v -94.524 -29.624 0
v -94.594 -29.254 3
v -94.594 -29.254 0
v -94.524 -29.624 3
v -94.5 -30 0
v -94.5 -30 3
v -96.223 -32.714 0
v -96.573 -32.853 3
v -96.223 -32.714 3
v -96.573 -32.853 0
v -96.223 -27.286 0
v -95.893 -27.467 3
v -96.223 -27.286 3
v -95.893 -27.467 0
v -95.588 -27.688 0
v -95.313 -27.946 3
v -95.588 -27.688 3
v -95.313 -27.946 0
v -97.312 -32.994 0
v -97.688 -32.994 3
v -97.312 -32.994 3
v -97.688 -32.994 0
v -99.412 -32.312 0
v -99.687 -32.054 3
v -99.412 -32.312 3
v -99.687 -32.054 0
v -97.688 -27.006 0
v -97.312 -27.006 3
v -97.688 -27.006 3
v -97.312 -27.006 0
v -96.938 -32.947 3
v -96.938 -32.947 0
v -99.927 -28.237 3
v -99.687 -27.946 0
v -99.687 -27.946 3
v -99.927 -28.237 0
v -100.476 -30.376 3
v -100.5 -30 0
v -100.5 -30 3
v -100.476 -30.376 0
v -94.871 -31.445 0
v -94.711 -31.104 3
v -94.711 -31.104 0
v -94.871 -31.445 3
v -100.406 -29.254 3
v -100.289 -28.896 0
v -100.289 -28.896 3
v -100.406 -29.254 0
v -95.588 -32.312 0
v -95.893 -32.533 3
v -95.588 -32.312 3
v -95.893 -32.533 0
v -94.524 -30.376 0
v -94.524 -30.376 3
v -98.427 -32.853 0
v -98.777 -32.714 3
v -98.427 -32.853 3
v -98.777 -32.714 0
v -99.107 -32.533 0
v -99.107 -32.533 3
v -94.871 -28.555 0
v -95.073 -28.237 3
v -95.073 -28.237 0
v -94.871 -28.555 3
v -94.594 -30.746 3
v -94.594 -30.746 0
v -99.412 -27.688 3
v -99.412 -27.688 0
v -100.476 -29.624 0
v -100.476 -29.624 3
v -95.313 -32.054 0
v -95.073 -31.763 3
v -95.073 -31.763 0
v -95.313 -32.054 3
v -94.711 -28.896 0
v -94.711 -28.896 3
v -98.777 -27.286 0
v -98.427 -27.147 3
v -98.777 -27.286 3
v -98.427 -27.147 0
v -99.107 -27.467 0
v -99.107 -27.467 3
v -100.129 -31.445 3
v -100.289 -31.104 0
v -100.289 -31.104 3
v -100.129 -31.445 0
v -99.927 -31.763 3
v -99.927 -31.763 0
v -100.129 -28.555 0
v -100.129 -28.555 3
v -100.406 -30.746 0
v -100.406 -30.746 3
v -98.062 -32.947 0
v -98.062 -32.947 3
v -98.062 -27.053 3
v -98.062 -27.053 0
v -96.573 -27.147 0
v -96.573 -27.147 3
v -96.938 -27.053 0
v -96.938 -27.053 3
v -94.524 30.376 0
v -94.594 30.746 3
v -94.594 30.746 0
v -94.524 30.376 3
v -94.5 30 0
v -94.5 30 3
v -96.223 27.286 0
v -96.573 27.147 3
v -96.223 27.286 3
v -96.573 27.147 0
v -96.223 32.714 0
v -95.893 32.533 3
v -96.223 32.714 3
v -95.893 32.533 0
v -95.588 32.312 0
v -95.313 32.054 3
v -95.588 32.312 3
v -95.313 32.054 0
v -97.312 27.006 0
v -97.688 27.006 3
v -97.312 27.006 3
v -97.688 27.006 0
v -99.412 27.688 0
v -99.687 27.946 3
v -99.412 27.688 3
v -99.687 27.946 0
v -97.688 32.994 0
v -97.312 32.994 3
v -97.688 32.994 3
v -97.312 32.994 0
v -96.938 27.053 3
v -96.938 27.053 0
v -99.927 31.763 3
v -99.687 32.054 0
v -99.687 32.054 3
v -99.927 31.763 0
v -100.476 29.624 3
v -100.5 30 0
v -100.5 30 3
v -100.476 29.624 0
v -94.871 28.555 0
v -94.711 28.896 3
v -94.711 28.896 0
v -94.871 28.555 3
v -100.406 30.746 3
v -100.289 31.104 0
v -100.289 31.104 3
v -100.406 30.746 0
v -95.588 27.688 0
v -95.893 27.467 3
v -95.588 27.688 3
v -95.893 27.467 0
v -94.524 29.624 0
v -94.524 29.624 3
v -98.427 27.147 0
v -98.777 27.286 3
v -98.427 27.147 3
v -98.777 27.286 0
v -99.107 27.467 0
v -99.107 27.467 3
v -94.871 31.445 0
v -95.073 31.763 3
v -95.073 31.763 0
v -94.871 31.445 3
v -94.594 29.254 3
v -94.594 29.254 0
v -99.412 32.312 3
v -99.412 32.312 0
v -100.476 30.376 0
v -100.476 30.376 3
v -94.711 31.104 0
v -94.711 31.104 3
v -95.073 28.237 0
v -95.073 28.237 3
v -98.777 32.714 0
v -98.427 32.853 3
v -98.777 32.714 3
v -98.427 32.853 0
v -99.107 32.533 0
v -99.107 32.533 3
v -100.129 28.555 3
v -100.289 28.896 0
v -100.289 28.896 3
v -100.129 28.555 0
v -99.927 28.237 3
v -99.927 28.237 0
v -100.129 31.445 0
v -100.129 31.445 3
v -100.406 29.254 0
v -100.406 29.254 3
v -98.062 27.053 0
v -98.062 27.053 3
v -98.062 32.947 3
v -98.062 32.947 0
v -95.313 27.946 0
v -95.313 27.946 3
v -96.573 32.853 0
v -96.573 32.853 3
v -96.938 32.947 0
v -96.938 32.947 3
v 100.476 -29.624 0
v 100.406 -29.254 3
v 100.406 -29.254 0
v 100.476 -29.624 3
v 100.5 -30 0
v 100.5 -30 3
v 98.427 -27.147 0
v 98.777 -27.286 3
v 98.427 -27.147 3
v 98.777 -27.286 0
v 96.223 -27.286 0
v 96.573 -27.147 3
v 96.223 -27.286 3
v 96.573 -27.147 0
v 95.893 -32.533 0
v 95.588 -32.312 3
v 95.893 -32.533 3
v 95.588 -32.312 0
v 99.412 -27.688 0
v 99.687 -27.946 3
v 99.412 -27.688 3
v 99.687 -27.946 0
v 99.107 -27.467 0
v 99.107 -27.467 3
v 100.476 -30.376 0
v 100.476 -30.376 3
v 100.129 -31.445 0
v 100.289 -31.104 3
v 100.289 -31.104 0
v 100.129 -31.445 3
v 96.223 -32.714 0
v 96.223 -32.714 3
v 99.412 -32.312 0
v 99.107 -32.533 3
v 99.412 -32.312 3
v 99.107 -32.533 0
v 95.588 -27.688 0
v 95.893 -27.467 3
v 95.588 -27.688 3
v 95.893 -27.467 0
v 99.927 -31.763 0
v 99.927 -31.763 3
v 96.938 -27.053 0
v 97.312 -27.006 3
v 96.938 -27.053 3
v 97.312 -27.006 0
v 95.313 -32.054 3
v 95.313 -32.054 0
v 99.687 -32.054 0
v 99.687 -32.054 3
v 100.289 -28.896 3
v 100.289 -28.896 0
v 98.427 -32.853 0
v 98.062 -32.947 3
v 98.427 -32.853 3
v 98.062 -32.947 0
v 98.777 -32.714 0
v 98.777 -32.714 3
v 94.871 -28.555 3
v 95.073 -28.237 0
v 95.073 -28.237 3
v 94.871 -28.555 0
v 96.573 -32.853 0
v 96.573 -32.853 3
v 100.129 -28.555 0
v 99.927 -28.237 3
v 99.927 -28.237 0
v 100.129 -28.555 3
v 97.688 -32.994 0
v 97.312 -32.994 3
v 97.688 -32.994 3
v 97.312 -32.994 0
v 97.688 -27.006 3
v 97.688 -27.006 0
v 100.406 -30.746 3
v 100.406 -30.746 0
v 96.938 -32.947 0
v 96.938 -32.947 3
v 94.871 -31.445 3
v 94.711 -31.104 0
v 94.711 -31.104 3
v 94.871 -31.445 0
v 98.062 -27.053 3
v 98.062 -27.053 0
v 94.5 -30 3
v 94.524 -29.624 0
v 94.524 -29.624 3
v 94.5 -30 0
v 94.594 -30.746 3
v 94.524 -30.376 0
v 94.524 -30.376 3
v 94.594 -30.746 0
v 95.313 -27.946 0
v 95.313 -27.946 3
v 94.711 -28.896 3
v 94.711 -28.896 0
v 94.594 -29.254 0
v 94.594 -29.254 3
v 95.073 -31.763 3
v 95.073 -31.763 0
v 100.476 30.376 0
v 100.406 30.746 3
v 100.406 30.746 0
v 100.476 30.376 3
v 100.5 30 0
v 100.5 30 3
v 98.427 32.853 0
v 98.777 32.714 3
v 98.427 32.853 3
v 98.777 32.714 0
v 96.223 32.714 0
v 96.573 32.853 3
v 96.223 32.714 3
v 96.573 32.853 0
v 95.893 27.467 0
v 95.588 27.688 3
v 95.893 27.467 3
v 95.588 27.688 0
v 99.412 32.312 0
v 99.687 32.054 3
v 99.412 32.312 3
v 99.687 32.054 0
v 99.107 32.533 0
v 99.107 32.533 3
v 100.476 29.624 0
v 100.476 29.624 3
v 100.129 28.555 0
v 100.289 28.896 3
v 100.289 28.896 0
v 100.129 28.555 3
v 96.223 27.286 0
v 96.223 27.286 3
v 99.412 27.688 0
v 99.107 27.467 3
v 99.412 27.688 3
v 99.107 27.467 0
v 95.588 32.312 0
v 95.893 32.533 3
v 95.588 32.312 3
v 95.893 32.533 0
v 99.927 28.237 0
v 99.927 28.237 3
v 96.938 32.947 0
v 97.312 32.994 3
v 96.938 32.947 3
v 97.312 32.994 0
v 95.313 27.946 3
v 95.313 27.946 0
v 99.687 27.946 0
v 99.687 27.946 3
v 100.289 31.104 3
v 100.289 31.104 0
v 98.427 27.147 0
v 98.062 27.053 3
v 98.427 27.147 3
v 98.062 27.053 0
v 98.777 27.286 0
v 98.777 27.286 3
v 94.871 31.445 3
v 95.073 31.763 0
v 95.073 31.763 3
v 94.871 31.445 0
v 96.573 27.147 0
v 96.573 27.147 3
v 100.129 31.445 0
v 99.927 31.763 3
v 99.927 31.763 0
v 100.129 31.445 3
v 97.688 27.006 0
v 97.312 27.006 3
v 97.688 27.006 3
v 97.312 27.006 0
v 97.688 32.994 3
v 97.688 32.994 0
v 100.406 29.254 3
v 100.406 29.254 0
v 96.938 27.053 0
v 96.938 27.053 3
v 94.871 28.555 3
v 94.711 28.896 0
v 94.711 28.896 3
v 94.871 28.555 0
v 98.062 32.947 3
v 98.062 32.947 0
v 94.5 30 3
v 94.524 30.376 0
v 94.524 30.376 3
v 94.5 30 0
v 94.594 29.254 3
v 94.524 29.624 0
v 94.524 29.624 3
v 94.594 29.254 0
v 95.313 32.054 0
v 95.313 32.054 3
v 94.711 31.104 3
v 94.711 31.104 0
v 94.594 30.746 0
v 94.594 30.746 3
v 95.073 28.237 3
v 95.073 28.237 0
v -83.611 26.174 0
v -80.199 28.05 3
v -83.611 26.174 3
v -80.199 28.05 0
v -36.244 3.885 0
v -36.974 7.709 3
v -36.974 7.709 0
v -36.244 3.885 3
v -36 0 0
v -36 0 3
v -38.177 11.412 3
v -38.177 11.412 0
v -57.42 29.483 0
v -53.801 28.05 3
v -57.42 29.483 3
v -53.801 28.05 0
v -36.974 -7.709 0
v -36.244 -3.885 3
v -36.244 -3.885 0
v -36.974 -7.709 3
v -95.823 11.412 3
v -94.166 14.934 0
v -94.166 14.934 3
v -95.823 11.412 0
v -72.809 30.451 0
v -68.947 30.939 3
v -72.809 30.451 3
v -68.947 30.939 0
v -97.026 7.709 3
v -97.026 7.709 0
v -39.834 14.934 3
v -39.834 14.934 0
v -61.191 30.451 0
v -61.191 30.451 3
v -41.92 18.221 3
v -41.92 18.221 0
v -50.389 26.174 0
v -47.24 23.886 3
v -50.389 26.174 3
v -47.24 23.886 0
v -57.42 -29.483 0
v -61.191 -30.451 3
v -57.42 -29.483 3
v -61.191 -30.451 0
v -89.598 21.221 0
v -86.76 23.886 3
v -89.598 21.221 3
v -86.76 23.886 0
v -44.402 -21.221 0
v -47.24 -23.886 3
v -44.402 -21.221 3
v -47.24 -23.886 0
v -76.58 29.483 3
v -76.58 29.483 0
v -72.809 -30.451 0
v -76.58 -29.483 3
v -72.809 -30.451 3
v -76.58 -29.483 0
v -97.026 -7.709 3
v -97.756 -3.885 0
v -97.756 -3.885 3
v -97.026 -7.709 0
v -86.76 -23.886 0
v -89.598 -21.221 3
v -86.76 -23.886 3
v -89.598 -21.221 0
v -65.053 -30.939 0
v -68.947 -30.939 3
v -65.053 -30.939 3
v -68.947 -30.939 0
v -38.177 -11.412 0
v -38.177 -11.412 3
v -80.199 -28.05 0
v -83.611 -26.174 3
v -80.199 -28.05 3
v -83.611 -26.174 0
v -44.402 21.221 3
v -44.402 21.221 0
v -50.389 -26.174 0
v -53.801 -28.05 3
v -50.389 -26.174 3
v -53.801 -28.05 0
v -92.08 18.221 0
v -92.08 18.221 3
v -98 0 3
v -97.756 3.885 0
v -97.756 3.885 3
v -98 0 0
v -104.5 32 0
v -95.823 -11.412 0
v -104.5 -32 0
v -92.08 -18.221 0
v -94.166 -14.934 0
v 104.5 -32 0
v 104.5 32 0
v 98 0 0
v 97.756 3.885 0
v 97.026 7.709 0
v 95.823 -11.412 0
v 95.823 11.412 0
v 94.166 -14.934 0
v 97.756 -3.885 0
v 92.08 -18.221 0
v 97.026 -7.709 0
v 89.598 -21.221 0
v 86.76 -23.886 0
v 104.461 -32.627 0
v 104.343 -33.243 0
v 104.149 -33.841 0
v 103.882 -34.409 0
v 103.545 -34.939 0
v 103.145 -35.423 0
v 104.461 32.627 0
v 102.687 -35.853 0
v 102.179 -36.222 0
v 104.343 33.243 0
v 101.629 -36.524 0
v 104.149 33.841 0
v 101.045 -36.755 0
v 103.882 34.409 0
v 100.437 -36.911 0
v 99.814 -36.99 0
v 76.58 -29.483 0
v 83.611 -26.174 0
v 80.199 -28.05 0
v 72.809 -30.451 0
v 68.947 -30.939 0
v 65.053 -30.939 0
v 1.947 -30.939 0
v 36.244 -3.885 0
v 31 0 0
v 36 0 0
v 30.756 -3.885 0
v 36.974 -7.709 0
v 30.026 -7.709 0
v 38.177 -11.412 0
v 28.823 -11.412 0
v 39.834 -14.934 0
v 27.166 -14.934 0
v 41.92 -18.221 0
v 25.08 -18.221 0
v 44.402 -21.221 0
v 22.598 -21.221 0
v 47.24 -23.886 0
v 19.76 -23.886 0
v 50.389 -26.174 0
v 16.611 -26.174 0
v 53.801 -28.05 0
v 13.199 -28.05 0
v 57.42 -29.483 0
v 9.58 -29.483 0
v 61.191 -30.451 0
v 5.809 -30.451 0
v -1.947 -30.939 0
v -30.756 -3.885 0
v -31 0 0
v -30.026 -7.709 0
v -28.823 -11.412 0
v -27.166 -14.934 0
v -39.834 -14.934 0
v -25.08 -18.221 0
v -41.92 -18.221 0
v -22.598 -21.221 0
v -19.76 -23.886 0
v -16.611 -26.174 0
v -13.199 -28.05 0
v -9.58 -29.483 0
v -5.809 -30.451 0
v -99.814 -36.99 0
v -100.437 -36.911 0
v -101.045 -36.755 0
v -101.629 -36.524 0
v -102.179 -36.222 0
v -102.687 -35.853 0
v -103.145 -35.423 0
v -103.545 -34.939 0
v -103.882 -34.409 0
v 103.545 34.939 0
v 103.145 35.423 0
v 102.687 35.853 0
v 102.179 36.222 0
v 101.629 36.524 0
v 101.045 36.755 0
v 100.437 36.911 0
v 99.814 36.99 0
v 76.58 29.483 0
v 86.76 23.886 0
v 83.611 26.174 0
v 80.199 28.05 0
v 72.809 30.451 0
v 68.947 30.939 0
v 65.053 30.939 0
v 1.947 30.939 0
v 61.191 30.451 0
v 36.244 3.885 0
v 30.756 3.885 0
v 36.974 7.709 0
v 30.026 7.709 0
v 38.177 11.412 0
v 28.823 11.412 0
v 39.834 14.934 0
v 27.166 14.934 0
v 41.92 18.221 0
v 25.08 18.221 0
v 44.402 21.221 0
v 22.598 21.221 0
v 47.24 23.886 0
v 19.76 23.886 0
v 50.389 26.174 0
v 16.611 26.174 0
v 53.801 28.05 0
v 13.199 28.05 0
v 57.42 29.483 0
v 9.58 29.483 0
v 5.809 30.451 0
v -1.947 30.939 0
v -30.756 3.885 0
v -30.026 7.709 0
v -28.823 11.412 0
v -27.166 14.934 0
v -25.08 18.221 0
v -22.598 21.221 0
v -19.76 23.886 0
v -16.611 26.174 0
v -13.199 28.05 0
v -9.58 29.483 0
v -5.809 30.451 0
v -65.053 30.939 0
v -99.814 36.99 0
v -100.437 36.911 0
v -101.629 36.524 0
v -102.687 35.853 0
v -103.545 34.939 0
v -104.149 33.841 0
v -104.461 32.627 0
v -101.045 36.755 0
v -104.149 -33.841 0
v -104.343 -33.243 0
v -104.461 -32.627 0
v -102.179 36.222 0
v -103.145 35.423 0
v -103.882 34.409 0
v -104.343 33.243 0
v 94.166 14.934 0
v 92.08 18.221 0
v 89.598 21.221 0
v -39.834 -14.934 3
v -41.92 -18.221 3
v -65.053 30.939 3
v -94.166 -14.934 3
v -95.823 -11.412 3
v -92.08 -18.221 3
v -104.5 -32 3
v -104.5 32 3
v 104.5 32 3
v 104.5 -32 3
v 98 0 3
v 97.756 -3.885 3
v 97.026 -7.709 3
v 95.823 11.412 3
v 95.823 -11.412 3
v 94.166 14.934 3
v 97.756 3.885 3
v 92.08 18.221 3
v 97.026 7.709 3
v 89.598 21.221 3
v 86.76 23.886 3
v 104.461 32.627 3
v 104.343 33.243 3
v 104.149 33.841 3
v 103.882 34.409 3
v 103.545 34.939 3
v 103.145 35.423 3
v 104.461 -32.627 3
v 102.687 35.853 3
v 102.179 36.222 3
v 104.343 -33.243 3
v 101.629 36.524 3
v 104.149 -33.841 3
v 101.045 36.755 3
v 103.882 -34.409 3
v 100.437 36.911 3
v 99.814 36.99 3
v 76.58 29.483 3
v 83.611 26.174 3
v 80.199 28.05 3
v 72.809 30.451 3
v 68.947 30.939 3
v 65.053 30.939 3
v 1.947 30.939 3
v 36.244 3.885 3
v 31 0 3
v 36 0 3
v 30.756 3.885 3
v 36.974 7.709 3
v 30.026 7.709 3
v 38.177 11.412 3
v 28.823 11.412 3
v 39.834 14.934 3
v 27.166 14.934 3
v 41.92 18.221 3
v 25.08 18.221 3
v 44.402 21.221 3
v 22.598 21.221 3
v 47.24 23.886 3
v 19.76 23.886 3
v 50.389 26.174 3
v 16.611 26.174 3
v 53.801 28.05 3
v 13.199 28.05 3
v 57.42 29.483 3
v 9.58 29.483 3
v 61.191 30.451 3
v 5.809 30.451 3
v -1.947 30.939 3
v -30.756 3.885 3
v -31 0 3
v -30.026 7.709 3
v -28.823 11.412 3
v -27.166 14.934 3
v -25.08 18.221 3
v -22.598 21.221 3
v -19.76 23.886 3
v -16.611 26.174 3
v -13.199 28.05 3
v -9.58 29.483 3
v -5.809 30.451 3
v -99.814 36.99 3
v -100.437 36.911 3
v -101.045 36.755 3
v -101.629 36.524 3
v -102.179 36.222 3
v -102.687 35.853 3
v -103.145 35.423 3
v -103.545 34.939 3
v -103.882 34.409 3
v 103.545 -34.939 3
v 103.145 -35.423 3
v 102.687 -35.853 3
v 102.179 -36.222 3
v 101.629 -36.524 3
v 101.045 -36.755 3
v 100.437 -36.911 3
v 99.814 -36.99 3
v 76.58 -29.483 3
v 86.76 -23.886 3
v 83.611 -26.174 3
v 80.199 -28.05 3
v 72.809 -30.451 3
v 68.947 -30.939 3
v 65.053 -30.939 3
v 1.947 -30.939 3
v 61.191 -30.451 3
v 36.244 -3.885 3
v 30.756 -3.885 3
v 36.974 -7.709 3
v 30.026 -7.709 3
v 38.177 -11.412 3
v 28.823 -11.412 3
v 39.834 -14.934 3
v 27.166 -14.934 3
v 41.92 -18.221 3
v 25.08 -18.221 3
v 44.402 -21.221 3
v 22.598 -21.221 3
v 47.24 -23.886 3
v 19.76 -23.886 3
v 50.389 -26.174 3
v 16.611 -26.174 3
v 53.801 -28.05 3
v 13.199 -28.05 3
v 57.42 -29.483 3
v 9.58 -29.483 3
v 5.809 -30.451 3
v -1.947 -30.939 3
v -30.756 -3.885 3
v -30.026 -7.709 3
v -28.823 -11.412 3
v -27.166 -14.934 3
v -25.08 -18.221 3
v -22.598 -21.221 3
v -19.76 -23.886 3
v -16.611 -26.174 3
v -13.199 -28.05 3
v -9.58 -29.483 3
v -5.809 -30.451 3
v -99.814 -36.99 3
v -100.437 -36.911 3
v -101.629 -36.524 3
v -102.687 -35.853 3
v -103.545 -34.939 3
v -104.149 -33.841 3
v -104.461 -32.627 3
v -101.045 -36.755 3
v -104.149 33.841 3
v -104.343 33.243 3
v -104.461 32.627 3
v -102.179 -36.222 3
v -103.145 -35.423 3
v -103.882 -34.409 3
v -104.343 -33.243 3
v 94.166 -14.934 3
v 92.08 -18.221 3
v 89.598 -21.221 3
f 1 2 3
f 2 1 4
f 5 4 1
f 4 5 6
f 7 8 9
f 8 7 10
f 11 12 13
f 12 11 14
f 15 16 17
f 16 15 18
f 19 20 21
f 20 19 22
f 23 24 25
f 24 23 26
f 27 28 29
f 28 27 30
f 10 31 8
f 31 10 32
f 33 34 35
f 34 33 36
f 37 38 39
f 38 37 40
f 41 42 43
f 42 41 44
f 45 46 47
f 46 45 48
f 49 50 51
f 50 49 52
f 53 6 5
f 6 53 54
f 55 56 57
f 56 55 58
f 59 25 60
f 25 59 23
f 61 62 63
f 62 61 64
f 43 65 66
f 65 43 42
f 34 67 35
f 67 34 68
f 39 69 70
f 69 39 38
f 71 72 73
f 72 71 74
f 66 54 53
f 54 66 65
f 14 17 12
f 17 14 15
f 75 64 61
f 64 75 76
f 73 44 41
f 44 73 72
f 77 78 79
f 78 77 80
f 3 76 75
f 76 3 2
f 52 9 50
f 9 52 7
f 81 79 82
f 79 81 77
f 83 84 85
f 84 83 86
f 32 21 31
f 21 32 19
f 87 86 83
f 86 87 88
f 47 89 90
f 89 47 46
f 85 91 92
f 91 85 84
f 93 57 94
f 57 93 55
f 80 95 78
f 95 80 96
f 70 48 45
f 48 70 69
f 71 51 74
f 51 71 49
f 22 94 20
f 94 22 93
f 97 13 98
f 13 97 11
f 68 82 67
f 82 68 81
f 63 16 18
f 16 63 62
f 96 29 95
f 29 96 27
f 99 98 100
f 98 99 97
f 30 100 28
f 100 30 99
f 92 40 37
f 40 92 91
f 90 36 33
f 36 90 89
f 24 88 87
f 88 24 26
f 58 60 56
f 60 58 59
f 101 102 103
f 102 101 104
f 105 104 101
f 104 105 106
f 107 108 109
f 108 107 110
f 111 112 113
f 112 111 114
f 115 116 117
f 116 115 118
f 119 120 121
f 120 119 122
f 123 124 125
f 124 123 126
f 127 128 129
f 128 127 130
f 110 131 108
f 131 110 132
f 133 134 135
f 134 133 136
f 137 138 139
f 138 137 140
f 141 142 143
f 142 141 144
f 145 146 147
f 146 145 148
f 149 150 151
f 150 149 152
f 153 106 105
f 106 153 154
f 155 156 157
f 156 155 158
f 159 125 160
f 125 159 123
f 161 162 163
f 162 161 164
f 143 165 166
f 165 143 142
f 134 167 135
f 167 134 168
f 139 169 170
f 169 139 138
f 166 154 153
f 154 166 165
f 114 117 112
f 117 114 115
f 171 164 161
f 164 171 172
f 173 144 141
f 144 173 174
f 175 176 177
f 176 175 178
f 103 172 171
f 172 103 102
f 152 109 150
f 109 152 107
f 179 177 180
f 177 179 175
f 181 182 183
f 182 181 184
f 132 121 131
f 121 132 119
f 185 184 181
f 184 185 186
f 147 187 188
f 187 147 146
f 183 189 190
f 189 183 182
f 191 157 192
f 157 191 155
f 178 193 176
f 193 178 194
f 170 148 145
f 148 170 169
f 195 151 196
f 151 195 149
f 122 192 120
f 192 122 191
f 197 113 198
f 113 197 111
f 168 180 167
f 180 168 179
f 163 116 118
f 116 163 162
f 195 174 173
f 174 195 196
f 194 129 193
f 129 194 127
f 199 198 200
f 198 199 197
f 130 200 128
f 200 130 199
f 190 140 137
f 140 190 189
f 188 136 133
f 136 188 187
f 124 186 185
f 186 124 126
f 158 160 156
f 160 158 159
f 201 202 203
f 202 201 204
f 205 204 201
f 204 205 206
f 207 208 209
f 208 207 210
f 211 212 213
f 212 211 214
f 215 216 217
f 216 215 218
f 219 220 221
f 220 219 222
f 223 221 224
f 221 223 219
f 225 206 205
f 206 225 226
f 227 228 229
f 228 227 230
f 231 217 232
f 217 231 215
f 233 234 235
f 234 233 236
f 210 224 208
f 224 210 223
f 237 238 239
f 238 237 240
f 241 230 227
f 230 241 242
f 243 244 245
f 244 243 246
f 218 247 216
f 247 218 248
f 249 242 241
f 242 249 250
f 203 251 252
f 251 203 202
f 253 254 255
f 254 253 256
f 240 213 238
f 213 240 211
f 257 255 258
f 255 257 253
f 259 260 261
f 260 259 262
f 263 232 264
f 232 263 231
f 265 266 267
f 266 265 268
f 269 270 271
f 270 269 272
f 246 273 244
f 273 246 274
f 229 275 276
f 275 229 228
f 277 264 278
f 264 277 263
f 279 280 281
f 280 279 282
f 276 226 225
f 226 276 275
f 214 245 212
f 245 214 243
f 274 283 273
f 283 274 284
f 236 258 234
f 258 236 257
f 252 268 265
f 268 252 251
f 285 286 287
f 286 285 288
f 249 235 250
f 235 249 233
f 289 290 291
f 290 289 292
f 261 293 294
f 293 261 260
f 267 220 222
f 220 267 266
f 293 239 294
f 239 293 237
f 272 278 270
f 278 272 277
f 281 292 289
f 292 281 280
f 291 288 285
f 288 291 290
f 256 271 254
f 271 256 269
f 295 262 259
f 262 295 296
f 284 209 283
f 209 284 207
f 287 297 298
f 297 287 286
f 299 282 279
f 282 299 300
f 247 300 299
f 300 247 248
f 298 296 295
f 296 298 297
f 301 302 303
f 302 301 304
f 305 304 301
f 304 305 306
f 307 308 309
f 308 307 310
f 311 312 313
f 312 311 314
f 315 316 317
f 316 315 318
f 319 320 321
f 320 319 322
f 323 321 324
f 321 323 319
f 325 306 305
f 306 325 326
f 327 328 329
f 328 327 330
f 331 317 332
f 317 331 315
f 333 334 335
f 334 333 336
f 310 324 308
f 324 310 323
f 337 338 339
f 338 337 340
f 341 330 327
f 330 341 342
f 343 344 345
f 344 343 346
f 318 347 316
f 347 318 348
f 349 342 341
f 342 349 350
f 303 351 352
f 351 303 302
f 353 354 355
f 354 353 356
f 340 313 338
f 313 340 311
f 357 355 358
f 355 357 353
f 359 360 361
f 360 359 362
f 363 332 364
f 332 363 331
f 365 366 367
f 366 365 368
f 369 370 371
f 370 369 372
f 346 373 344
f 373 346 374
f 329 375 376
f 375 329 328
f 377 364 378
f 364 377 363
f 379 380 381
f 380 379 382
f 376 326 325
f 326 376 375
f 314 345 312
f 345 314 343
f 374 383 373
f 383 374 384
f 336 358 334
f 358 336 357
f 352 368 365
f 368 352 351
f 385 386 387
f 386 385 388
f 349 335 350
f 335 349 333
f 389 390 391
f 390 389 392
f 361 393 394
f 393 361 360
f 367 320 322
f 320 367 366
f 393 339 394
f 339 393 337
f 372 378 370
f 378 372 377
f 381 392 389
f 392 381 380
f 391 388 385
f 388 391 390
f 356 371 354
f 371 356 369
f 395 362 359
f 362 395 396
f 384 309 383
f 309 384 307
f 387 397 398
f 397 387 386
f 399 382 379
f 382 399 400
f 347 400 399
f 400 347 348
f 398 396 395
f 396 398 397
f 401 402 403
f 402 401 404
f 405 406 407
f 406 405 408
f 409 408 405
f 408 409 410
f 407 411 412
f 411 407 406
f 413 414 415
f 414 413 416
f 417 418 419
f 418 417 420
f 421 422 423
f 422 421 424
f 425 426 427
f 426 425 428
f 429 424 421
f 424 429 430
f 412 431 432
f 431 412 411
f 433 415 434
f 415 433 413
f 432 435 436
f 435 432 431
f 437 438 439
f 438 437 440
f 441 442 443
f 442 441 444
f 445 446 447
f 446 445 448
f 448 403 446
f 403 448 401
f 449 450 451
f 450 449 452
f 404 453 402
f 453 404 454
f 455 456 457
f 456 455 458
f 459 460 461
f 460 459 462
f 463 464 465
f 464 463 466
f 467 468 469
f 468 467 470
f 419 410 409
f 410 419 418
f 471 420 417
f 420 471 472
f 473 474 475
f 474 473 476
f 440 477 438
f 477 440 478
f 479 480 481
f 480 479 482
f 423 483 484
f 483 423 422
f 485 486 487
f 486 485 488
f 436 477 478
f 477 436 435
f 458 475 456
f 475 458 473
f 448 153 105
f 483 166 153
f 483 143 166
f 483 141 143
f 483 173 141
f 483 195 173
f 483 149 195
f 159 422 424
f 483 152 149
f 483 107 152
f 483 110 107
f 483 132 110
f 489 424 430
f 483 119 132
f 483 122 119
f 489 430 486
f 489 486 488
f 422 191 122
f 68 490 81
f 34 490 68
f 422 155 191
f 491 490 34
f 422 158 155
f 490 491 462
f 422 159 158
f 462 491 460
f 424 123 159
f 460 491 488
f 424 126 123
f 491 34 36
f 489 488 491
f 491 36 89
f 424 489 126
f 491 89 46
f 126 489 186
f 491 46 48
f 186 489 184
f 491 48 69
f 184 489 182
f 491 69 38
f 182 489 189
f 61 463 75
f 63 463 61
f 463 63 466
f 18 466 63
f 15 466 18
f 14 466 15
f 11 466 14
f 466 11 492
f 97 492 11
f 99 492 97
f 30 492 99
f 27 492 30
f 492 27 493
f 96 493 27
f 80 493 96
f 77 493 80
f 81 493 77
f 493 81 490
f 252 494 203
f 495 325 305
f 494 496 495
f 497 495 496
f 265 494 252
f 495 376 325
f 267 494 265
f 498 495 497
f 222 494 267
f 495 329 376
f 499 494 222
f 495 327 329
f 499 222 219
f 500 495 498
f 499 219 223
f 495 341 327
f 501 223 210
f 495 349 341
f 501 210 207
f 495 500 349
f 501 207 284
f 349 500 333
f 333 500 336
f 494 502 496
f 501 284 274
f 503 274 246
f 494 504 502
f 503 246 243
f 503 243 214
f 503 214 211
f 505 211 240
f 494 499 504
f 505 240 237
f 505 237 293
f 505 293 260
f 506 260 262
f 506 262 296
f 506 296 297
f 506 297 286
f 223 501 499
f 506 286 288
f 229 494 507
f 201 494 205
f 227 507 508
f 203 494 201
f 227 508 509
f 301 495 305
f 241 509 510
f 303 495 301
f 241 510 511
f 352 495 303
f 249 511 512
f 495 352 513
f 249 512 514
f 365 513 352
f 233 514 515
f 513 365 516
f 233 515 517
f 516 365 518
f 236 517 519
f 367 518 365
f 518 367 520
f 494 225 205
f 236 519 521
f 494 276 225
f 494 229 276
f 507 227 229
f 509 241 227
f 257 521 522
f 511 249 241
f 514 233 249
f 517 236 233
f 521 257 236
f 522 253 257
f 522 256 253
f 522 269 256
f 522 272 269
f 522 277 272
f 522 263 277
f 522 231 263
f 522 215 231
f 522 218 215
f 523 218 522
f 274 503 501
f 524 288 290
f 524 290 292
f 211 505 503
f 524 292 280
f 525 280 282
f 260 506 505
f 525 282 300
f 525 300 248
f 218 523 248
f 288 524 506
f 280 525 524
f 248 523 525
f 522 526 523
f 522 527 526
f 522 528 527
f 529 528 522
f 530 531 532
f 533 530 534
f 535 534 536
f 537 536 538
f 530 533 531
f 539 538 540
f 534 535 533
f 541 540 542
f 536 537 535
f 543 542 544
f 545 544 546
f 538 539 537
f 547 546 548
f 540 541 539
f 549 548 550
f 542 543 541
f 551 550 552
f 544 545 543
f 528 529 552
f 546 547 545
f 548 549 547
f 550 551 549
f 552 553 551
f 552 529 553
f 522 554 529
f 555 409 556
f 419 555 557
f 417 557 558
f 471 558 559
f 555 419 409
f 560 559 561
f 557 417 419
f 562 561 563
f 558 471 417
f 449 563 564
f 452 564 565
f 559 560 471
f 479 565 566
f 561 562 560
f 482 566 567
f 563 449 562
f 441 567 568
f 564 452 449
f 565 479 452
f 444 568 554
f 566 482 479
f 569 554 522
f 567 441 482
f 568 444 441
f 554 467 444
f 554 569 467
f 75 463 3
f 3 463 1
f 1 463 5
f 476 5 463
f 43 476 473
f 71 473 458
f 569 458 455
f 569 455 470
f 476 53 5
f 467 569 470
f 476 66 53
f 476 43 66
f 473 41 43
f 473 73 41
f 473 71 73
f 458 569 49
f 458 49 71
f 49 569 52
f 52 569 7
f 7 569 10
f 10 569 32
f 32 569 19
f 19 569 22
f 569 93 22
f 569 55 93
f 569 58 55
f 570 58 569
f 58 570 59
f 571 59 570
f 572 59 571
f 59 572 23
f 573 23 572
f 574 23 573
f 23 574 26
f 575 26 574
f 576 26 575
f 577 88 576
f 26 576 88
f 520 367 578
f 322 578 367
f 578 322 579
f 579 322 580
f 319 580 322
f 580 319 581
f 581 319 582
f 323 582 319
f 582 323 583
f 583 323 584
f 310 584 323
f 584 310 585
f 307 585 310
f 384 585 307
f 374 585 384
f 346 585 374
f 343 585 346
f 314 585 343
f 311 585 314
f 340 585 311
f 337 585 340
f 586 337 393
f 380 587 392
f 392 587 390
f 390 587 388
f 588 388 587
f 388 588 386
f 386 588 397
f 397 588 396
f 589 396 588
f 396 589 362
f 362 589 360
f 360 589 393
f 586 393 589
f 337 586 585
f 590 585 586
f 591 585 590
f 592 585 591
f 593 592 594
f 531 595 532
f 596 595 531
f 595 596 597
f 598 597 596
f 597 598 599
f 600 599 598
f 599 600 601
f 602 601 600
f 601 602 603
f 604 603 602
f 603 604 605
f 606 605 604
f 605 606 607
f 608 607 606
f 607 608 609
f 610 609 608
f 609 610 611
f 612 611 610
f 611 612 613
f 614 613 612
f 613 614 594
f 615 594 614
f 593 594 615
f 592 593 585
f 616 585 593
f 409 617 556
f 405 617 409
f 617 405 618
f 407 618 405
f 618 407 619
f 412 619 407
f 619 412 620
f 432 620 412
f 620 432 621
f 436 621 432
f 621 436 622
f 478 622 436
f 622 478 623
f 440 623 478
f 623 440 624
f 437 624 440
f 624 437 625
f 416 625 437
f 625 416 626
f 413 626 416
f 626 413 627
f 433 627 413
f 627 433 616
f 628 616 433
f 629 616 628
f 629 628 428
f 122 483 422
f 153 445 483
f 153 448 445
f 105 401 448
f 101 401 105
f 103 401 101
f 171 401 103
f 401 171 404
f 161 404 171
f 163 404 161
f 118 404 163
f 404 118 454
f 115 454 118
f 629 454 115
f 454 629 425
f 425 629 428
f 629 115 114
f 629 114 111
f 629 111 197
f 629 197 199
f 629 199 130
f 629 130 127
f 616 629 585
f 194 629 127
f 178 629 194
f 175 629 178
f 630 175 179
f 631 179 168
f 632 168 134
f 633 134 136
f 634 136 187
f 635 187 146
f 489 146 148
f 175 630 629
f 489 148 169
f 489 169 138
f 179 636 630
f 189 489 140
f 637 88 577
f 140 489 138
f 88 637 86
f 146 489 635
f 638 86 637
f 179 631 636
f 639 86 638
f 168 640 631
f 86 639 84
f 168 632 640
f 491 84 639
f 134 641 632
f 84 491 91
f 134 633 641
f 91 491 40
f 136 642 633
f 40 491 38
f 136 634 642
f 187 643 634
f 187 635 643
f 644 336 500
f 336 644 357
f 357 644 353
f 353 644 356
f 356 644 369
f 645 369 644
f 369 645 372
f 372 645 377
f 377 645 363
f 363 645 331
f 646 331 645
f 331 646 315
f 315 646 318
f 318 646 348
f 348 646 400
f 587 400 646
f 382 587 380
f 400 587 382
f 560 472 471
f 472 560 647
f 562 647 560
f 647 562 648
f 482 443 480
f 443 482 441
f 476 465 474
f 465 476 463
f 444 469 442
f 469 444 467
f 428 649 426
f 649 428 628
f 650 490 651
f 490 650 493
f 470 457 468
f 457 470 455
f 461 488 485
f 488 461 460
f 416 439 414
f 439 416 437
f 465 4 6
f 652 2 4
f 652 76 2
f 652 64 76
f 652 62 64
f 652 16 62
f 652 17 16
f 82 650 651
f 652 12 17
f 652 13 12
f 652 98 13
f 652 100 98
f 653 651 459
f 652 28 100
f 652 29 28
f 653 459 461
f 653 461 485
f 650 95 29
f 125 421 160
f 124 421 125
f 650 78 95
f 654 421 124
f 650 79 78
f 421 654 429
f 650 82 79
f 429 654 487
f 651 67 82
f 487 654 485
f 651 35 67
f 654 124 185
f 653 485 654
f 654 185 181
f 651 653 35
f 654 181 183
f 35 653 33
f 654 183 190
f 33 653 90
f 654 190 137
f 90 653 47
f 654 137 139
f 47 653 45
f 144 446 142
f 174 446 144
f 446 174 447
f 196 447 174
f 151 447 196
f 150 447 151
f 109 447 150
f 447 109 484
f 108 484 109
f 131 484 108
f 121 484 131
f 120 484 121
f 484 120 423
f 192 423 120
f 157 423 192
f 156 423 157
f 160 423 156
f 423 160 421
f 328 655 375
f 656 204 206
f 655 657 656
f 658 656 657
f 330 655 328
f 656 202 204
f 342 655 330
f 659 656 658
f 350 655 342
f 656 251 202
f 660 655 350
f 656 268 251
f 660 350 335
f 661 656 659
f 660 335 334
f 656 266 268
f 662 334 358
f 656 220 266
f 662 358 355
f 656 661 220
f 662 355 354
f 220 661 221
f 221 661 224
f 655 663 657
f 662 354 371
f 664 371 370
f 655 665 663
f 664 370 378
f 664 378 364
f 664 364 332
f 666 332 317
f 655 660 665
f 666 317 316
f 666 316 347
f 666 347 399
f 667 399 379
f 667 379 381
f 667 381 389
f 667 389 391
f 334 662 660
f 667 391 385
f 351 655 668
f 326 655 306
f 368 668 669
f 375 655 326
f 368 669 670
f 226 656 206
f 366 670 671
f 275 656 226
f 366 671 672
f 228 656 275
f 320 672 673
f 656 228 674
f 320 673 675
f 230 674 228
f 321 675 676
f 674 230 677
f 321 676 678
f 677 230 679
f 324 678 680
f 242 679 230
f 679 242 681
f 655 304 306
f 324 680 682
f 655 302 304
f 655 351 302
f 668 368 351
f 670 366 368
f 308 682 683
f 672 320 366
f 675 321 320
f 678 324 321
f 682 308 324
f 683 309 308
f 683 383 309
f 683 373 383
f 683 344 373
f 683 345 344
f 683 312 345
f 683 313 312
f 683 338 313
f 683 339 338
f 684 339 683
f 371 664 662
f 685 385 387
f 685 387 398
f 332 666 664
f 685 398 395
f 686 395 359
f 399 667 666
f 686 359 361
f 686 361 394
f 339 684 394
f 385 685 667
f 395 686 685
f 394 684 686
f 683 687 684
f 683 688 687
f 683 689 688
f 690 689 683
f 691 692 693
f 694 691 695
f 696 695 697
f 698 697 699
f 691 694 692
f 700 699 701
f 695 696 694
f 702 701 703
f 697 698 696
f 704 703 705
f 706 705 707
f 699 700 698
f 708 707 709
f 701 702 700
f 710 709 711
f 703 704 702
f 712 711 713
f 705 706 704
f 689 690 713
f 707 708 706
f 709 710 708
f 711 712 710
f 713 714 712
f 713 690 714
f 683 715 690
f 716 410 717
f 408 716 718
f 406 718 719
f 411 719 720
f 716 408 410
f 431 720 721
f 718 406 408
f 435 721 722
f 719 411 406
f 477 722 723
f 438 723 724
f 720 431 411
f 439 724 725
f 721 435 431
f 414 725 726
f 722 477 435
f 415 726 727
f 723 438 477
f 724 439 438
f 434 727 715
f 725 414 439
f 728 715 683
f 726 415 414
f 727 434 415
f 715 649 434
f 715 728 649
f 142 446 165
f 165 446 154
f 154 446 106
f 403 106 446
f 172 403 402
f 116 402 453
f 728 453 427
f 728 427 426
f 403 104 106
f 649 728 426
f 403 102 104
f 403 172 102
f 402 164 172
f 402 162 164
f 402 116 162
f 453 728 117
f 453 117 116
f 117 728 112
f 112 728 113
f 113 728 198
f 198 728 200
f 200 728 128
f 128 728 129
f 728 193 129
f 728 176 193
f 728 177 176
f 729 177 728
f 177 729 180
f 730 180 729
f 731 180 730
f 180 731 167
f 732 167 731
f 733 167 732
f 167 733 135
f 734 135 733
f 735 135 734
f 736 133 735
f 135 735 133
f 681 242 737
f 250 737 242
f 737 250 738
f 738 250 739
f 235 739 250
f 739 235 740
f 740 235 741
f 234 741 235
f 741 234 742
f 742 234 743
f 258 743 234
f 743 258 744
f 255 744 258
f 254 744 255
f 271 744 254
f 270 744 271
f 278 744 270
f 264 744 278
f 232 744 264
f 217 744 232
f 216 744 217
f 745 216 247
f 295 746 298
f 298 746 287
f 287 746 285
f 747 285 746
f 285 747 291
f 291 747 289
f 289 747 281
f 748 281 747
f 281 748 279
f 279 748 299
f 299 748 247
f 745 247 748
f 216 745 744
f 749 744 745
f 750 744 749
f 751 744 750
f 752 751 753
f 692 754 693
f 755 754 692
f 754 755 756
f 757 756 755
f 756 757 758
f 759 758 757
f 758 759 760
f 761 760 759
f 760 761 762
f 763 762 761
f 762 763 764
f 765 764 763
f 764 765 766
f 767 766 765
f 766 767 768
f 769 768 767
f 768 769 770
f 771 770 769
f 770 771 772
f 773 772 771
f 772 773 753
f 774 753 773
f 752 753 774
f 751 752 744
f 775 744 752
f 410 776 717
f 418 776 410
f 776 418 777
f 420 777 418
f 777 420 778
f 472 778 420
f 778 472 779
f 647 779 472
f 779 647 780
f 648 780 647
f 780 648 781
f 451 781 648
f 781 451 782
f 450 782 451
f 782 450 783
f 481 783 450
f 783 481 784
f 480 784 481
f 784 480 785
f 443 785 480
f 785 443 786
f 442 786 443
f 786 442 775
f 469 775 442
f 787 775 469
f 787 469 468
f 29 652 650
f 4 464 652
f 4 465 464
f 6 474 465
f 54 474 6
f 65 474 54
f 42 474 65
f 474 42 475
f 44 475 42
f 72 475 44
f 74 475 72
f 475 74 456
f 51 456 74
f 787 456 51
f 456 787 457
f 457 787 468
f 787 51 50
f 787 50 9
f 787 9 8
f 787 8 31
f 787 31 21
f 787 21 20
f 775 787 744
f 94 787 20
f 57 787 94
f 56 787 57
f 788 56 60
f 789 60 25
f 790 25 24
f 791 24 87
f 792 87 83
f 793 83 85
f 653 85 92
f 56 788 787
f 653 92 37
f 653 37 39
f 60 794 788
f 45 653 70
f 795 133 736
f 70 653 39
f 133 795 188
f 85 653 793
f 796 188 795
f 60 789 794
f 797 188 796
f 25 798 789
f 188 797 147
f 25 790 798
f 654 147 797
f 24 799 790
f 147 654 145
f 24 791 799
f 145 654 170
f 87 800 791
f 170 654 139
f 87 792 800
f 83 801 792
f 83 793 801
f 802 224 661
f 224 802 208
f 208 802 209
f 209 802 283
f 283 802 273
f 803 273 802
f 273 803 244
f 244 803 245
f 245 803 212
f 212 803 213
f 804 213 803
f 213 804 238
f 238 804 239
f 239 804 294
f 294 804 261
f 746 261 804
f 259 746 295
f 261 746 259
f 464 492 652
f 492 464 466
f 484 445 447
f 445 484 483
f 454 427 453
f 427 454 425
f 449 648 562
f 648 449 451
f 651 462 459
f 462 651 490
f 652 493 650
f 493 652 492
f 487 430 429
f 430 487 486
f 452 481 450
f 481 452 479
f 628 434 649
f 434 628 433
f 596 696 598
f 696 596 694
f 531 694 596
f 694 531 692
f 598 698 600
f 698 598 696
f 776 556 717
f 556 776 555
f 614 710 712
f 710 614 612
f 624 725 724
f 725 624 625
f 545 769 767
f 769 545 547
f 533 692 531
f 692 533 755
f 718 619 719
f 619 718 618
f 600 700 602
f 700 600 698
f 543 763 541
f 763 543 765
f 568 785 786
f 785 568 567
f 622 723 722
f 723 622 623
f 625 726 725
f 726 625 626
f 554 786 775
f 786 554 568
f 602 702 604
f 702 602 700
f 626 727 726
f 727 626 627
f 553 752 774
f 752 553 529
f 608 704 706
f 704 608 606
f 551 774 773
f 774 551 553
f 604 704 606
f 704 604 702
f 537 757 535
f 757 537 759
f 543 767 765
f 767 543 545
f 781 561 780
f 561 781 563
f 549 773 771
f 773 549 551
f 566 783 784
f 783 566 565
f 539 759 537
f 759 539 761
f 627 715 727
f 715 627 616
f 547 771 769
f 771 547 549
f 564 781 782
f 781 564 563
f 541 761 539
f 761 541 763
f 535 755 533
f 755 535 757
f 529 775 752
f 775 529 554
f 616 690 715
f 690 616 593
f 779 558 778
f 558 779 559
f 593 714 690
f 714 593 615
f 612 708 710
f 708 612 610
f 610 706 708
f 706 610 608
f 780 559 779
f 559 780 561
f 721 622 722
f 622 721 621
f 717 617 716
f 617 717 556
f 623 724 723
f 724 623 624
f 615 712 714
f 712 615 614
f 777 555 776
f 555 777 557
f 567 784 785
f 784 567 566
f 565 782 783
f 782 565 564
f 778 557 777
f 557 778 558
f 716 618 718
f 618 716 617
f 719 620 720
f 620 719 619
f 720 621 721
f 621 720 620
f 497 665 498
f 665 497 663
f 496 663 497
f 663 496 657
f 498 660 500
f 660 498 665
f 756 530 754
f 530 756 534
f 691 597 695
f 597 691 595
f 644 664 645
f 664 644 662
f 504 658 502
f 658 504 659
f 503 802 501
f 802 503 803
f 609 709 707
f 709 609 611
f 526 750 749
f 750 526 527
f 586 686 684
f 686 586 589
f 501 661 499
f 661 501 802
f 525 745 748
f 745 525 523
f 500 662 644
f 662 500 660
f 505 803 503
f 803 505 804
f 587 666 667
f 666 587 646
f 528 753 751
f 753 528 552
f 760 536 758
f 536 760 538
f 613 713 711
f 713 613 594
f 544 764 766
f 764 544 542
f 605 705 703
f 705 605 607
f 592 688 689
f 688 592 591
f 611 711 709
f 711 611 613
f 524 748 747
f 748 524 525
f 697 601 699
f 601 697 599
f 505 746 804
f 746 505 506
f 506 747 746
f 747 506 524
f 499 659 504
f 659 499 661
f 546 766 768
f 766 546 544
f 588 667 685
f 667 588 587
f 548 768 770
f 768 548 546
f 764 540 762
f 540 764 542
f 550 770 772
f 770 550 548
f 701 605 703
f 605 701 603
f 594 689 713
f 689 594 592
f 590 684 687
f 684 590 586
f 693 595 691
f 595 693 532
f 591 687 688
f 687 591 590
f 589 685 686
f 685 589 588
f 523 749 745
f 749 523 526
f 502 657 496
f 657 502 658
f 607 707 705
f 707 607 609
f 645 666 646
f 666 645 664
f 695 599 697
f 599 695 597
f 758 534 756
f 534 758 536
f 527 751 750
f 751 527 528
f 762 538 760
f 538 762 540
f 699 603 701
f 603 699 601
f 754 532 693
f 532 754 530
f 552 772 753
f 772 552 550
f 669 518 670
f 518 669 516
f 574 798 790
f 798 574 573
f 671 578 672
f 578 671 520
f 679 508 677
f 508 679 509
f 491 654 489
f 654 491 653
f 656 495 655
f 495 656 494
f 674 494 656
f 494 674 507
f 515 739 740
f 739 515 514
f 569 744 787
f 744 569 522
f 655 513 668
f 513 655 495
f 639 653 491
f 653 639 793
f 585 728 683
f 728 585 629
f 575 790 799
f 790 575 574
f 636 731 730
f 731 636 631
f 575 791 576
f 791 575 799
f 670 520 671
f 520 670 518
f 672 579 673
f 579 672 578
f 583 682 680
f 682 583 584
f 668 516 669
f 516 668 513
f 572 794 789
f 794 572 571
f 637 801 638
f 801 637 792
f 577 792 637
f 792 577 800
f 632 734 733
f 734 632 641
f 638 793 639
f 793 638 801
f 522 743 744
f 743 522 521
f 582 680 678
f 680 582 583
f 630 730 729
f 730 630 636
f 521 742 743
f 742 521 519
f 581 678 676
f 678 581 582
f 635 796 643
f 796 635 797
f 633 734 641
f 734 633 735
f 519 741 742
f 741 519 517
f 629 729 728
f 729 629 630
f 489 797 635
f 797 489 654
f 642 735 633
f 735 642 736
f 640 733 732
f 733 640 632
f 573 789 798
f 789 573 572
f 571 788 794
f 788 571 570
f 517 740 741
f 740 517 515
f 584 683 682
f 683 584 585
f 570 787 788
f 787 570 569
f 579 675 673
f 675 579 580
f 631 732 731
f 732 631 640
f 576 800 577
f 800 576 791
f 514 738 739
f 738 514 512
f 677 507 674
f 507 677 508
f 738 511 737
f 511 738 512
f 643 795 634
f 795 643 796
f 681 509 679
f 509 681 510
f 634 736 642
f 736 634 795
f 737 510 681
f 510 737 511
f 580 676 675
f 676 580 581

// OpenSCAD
$fn = 50;


difference() {
	union() {
		hull() {
			translate(v = [-99.5000000000, 32.0000000000, 0]) {
				cylinder(h = 3, r = 5);
			}
			translate(v = [99.5000000000, 32.0000000000, 0]) {
				cylinder(h = 3, r = 5);
			}
			translate(v = [-99.5000000000, -32.0000000000, 0]) {
				cylinder(h = 3, r = 5);
			}
			translate(v = [99.5000000000, -32.0000000000, 0]) {
				cylinder(h = 3, r = 5);
			}
		}
	}
	union() {
		#translate(v = [-97.5000000000, -30.0000000000, -100.0000000000]) {
			cylinder(h = 200, r = 3.0000000000);
		}
		#translate(v = [-97.5000000000, 30.0000000000, -100.0000000000]) {
			cylinder(h = 200, r = 3.0000000000);
		}
		#translate(v = [97.5000000000, -30.0000000000, -100.0000000000]) {
			cylinder(h = 200, r = 3.0000000000);
		}
		#translate(v = [97.5000000000, 30.0000000000, -100.0000000000]) {
			cylinder(h = 200, r = 3.0000000000);
		}
		#translate(v = [-67.0000000000, 0, 0]) {
			cylinder(h = 3, r = 31.0000000000);
		}
		#cylinder(h = 3, r = 31.0000000000);
		#translate(v = [67.0000000000, 0, 0]) {
			cylinder(h = 3, r = 31.0000000000);
		}
	}
}
